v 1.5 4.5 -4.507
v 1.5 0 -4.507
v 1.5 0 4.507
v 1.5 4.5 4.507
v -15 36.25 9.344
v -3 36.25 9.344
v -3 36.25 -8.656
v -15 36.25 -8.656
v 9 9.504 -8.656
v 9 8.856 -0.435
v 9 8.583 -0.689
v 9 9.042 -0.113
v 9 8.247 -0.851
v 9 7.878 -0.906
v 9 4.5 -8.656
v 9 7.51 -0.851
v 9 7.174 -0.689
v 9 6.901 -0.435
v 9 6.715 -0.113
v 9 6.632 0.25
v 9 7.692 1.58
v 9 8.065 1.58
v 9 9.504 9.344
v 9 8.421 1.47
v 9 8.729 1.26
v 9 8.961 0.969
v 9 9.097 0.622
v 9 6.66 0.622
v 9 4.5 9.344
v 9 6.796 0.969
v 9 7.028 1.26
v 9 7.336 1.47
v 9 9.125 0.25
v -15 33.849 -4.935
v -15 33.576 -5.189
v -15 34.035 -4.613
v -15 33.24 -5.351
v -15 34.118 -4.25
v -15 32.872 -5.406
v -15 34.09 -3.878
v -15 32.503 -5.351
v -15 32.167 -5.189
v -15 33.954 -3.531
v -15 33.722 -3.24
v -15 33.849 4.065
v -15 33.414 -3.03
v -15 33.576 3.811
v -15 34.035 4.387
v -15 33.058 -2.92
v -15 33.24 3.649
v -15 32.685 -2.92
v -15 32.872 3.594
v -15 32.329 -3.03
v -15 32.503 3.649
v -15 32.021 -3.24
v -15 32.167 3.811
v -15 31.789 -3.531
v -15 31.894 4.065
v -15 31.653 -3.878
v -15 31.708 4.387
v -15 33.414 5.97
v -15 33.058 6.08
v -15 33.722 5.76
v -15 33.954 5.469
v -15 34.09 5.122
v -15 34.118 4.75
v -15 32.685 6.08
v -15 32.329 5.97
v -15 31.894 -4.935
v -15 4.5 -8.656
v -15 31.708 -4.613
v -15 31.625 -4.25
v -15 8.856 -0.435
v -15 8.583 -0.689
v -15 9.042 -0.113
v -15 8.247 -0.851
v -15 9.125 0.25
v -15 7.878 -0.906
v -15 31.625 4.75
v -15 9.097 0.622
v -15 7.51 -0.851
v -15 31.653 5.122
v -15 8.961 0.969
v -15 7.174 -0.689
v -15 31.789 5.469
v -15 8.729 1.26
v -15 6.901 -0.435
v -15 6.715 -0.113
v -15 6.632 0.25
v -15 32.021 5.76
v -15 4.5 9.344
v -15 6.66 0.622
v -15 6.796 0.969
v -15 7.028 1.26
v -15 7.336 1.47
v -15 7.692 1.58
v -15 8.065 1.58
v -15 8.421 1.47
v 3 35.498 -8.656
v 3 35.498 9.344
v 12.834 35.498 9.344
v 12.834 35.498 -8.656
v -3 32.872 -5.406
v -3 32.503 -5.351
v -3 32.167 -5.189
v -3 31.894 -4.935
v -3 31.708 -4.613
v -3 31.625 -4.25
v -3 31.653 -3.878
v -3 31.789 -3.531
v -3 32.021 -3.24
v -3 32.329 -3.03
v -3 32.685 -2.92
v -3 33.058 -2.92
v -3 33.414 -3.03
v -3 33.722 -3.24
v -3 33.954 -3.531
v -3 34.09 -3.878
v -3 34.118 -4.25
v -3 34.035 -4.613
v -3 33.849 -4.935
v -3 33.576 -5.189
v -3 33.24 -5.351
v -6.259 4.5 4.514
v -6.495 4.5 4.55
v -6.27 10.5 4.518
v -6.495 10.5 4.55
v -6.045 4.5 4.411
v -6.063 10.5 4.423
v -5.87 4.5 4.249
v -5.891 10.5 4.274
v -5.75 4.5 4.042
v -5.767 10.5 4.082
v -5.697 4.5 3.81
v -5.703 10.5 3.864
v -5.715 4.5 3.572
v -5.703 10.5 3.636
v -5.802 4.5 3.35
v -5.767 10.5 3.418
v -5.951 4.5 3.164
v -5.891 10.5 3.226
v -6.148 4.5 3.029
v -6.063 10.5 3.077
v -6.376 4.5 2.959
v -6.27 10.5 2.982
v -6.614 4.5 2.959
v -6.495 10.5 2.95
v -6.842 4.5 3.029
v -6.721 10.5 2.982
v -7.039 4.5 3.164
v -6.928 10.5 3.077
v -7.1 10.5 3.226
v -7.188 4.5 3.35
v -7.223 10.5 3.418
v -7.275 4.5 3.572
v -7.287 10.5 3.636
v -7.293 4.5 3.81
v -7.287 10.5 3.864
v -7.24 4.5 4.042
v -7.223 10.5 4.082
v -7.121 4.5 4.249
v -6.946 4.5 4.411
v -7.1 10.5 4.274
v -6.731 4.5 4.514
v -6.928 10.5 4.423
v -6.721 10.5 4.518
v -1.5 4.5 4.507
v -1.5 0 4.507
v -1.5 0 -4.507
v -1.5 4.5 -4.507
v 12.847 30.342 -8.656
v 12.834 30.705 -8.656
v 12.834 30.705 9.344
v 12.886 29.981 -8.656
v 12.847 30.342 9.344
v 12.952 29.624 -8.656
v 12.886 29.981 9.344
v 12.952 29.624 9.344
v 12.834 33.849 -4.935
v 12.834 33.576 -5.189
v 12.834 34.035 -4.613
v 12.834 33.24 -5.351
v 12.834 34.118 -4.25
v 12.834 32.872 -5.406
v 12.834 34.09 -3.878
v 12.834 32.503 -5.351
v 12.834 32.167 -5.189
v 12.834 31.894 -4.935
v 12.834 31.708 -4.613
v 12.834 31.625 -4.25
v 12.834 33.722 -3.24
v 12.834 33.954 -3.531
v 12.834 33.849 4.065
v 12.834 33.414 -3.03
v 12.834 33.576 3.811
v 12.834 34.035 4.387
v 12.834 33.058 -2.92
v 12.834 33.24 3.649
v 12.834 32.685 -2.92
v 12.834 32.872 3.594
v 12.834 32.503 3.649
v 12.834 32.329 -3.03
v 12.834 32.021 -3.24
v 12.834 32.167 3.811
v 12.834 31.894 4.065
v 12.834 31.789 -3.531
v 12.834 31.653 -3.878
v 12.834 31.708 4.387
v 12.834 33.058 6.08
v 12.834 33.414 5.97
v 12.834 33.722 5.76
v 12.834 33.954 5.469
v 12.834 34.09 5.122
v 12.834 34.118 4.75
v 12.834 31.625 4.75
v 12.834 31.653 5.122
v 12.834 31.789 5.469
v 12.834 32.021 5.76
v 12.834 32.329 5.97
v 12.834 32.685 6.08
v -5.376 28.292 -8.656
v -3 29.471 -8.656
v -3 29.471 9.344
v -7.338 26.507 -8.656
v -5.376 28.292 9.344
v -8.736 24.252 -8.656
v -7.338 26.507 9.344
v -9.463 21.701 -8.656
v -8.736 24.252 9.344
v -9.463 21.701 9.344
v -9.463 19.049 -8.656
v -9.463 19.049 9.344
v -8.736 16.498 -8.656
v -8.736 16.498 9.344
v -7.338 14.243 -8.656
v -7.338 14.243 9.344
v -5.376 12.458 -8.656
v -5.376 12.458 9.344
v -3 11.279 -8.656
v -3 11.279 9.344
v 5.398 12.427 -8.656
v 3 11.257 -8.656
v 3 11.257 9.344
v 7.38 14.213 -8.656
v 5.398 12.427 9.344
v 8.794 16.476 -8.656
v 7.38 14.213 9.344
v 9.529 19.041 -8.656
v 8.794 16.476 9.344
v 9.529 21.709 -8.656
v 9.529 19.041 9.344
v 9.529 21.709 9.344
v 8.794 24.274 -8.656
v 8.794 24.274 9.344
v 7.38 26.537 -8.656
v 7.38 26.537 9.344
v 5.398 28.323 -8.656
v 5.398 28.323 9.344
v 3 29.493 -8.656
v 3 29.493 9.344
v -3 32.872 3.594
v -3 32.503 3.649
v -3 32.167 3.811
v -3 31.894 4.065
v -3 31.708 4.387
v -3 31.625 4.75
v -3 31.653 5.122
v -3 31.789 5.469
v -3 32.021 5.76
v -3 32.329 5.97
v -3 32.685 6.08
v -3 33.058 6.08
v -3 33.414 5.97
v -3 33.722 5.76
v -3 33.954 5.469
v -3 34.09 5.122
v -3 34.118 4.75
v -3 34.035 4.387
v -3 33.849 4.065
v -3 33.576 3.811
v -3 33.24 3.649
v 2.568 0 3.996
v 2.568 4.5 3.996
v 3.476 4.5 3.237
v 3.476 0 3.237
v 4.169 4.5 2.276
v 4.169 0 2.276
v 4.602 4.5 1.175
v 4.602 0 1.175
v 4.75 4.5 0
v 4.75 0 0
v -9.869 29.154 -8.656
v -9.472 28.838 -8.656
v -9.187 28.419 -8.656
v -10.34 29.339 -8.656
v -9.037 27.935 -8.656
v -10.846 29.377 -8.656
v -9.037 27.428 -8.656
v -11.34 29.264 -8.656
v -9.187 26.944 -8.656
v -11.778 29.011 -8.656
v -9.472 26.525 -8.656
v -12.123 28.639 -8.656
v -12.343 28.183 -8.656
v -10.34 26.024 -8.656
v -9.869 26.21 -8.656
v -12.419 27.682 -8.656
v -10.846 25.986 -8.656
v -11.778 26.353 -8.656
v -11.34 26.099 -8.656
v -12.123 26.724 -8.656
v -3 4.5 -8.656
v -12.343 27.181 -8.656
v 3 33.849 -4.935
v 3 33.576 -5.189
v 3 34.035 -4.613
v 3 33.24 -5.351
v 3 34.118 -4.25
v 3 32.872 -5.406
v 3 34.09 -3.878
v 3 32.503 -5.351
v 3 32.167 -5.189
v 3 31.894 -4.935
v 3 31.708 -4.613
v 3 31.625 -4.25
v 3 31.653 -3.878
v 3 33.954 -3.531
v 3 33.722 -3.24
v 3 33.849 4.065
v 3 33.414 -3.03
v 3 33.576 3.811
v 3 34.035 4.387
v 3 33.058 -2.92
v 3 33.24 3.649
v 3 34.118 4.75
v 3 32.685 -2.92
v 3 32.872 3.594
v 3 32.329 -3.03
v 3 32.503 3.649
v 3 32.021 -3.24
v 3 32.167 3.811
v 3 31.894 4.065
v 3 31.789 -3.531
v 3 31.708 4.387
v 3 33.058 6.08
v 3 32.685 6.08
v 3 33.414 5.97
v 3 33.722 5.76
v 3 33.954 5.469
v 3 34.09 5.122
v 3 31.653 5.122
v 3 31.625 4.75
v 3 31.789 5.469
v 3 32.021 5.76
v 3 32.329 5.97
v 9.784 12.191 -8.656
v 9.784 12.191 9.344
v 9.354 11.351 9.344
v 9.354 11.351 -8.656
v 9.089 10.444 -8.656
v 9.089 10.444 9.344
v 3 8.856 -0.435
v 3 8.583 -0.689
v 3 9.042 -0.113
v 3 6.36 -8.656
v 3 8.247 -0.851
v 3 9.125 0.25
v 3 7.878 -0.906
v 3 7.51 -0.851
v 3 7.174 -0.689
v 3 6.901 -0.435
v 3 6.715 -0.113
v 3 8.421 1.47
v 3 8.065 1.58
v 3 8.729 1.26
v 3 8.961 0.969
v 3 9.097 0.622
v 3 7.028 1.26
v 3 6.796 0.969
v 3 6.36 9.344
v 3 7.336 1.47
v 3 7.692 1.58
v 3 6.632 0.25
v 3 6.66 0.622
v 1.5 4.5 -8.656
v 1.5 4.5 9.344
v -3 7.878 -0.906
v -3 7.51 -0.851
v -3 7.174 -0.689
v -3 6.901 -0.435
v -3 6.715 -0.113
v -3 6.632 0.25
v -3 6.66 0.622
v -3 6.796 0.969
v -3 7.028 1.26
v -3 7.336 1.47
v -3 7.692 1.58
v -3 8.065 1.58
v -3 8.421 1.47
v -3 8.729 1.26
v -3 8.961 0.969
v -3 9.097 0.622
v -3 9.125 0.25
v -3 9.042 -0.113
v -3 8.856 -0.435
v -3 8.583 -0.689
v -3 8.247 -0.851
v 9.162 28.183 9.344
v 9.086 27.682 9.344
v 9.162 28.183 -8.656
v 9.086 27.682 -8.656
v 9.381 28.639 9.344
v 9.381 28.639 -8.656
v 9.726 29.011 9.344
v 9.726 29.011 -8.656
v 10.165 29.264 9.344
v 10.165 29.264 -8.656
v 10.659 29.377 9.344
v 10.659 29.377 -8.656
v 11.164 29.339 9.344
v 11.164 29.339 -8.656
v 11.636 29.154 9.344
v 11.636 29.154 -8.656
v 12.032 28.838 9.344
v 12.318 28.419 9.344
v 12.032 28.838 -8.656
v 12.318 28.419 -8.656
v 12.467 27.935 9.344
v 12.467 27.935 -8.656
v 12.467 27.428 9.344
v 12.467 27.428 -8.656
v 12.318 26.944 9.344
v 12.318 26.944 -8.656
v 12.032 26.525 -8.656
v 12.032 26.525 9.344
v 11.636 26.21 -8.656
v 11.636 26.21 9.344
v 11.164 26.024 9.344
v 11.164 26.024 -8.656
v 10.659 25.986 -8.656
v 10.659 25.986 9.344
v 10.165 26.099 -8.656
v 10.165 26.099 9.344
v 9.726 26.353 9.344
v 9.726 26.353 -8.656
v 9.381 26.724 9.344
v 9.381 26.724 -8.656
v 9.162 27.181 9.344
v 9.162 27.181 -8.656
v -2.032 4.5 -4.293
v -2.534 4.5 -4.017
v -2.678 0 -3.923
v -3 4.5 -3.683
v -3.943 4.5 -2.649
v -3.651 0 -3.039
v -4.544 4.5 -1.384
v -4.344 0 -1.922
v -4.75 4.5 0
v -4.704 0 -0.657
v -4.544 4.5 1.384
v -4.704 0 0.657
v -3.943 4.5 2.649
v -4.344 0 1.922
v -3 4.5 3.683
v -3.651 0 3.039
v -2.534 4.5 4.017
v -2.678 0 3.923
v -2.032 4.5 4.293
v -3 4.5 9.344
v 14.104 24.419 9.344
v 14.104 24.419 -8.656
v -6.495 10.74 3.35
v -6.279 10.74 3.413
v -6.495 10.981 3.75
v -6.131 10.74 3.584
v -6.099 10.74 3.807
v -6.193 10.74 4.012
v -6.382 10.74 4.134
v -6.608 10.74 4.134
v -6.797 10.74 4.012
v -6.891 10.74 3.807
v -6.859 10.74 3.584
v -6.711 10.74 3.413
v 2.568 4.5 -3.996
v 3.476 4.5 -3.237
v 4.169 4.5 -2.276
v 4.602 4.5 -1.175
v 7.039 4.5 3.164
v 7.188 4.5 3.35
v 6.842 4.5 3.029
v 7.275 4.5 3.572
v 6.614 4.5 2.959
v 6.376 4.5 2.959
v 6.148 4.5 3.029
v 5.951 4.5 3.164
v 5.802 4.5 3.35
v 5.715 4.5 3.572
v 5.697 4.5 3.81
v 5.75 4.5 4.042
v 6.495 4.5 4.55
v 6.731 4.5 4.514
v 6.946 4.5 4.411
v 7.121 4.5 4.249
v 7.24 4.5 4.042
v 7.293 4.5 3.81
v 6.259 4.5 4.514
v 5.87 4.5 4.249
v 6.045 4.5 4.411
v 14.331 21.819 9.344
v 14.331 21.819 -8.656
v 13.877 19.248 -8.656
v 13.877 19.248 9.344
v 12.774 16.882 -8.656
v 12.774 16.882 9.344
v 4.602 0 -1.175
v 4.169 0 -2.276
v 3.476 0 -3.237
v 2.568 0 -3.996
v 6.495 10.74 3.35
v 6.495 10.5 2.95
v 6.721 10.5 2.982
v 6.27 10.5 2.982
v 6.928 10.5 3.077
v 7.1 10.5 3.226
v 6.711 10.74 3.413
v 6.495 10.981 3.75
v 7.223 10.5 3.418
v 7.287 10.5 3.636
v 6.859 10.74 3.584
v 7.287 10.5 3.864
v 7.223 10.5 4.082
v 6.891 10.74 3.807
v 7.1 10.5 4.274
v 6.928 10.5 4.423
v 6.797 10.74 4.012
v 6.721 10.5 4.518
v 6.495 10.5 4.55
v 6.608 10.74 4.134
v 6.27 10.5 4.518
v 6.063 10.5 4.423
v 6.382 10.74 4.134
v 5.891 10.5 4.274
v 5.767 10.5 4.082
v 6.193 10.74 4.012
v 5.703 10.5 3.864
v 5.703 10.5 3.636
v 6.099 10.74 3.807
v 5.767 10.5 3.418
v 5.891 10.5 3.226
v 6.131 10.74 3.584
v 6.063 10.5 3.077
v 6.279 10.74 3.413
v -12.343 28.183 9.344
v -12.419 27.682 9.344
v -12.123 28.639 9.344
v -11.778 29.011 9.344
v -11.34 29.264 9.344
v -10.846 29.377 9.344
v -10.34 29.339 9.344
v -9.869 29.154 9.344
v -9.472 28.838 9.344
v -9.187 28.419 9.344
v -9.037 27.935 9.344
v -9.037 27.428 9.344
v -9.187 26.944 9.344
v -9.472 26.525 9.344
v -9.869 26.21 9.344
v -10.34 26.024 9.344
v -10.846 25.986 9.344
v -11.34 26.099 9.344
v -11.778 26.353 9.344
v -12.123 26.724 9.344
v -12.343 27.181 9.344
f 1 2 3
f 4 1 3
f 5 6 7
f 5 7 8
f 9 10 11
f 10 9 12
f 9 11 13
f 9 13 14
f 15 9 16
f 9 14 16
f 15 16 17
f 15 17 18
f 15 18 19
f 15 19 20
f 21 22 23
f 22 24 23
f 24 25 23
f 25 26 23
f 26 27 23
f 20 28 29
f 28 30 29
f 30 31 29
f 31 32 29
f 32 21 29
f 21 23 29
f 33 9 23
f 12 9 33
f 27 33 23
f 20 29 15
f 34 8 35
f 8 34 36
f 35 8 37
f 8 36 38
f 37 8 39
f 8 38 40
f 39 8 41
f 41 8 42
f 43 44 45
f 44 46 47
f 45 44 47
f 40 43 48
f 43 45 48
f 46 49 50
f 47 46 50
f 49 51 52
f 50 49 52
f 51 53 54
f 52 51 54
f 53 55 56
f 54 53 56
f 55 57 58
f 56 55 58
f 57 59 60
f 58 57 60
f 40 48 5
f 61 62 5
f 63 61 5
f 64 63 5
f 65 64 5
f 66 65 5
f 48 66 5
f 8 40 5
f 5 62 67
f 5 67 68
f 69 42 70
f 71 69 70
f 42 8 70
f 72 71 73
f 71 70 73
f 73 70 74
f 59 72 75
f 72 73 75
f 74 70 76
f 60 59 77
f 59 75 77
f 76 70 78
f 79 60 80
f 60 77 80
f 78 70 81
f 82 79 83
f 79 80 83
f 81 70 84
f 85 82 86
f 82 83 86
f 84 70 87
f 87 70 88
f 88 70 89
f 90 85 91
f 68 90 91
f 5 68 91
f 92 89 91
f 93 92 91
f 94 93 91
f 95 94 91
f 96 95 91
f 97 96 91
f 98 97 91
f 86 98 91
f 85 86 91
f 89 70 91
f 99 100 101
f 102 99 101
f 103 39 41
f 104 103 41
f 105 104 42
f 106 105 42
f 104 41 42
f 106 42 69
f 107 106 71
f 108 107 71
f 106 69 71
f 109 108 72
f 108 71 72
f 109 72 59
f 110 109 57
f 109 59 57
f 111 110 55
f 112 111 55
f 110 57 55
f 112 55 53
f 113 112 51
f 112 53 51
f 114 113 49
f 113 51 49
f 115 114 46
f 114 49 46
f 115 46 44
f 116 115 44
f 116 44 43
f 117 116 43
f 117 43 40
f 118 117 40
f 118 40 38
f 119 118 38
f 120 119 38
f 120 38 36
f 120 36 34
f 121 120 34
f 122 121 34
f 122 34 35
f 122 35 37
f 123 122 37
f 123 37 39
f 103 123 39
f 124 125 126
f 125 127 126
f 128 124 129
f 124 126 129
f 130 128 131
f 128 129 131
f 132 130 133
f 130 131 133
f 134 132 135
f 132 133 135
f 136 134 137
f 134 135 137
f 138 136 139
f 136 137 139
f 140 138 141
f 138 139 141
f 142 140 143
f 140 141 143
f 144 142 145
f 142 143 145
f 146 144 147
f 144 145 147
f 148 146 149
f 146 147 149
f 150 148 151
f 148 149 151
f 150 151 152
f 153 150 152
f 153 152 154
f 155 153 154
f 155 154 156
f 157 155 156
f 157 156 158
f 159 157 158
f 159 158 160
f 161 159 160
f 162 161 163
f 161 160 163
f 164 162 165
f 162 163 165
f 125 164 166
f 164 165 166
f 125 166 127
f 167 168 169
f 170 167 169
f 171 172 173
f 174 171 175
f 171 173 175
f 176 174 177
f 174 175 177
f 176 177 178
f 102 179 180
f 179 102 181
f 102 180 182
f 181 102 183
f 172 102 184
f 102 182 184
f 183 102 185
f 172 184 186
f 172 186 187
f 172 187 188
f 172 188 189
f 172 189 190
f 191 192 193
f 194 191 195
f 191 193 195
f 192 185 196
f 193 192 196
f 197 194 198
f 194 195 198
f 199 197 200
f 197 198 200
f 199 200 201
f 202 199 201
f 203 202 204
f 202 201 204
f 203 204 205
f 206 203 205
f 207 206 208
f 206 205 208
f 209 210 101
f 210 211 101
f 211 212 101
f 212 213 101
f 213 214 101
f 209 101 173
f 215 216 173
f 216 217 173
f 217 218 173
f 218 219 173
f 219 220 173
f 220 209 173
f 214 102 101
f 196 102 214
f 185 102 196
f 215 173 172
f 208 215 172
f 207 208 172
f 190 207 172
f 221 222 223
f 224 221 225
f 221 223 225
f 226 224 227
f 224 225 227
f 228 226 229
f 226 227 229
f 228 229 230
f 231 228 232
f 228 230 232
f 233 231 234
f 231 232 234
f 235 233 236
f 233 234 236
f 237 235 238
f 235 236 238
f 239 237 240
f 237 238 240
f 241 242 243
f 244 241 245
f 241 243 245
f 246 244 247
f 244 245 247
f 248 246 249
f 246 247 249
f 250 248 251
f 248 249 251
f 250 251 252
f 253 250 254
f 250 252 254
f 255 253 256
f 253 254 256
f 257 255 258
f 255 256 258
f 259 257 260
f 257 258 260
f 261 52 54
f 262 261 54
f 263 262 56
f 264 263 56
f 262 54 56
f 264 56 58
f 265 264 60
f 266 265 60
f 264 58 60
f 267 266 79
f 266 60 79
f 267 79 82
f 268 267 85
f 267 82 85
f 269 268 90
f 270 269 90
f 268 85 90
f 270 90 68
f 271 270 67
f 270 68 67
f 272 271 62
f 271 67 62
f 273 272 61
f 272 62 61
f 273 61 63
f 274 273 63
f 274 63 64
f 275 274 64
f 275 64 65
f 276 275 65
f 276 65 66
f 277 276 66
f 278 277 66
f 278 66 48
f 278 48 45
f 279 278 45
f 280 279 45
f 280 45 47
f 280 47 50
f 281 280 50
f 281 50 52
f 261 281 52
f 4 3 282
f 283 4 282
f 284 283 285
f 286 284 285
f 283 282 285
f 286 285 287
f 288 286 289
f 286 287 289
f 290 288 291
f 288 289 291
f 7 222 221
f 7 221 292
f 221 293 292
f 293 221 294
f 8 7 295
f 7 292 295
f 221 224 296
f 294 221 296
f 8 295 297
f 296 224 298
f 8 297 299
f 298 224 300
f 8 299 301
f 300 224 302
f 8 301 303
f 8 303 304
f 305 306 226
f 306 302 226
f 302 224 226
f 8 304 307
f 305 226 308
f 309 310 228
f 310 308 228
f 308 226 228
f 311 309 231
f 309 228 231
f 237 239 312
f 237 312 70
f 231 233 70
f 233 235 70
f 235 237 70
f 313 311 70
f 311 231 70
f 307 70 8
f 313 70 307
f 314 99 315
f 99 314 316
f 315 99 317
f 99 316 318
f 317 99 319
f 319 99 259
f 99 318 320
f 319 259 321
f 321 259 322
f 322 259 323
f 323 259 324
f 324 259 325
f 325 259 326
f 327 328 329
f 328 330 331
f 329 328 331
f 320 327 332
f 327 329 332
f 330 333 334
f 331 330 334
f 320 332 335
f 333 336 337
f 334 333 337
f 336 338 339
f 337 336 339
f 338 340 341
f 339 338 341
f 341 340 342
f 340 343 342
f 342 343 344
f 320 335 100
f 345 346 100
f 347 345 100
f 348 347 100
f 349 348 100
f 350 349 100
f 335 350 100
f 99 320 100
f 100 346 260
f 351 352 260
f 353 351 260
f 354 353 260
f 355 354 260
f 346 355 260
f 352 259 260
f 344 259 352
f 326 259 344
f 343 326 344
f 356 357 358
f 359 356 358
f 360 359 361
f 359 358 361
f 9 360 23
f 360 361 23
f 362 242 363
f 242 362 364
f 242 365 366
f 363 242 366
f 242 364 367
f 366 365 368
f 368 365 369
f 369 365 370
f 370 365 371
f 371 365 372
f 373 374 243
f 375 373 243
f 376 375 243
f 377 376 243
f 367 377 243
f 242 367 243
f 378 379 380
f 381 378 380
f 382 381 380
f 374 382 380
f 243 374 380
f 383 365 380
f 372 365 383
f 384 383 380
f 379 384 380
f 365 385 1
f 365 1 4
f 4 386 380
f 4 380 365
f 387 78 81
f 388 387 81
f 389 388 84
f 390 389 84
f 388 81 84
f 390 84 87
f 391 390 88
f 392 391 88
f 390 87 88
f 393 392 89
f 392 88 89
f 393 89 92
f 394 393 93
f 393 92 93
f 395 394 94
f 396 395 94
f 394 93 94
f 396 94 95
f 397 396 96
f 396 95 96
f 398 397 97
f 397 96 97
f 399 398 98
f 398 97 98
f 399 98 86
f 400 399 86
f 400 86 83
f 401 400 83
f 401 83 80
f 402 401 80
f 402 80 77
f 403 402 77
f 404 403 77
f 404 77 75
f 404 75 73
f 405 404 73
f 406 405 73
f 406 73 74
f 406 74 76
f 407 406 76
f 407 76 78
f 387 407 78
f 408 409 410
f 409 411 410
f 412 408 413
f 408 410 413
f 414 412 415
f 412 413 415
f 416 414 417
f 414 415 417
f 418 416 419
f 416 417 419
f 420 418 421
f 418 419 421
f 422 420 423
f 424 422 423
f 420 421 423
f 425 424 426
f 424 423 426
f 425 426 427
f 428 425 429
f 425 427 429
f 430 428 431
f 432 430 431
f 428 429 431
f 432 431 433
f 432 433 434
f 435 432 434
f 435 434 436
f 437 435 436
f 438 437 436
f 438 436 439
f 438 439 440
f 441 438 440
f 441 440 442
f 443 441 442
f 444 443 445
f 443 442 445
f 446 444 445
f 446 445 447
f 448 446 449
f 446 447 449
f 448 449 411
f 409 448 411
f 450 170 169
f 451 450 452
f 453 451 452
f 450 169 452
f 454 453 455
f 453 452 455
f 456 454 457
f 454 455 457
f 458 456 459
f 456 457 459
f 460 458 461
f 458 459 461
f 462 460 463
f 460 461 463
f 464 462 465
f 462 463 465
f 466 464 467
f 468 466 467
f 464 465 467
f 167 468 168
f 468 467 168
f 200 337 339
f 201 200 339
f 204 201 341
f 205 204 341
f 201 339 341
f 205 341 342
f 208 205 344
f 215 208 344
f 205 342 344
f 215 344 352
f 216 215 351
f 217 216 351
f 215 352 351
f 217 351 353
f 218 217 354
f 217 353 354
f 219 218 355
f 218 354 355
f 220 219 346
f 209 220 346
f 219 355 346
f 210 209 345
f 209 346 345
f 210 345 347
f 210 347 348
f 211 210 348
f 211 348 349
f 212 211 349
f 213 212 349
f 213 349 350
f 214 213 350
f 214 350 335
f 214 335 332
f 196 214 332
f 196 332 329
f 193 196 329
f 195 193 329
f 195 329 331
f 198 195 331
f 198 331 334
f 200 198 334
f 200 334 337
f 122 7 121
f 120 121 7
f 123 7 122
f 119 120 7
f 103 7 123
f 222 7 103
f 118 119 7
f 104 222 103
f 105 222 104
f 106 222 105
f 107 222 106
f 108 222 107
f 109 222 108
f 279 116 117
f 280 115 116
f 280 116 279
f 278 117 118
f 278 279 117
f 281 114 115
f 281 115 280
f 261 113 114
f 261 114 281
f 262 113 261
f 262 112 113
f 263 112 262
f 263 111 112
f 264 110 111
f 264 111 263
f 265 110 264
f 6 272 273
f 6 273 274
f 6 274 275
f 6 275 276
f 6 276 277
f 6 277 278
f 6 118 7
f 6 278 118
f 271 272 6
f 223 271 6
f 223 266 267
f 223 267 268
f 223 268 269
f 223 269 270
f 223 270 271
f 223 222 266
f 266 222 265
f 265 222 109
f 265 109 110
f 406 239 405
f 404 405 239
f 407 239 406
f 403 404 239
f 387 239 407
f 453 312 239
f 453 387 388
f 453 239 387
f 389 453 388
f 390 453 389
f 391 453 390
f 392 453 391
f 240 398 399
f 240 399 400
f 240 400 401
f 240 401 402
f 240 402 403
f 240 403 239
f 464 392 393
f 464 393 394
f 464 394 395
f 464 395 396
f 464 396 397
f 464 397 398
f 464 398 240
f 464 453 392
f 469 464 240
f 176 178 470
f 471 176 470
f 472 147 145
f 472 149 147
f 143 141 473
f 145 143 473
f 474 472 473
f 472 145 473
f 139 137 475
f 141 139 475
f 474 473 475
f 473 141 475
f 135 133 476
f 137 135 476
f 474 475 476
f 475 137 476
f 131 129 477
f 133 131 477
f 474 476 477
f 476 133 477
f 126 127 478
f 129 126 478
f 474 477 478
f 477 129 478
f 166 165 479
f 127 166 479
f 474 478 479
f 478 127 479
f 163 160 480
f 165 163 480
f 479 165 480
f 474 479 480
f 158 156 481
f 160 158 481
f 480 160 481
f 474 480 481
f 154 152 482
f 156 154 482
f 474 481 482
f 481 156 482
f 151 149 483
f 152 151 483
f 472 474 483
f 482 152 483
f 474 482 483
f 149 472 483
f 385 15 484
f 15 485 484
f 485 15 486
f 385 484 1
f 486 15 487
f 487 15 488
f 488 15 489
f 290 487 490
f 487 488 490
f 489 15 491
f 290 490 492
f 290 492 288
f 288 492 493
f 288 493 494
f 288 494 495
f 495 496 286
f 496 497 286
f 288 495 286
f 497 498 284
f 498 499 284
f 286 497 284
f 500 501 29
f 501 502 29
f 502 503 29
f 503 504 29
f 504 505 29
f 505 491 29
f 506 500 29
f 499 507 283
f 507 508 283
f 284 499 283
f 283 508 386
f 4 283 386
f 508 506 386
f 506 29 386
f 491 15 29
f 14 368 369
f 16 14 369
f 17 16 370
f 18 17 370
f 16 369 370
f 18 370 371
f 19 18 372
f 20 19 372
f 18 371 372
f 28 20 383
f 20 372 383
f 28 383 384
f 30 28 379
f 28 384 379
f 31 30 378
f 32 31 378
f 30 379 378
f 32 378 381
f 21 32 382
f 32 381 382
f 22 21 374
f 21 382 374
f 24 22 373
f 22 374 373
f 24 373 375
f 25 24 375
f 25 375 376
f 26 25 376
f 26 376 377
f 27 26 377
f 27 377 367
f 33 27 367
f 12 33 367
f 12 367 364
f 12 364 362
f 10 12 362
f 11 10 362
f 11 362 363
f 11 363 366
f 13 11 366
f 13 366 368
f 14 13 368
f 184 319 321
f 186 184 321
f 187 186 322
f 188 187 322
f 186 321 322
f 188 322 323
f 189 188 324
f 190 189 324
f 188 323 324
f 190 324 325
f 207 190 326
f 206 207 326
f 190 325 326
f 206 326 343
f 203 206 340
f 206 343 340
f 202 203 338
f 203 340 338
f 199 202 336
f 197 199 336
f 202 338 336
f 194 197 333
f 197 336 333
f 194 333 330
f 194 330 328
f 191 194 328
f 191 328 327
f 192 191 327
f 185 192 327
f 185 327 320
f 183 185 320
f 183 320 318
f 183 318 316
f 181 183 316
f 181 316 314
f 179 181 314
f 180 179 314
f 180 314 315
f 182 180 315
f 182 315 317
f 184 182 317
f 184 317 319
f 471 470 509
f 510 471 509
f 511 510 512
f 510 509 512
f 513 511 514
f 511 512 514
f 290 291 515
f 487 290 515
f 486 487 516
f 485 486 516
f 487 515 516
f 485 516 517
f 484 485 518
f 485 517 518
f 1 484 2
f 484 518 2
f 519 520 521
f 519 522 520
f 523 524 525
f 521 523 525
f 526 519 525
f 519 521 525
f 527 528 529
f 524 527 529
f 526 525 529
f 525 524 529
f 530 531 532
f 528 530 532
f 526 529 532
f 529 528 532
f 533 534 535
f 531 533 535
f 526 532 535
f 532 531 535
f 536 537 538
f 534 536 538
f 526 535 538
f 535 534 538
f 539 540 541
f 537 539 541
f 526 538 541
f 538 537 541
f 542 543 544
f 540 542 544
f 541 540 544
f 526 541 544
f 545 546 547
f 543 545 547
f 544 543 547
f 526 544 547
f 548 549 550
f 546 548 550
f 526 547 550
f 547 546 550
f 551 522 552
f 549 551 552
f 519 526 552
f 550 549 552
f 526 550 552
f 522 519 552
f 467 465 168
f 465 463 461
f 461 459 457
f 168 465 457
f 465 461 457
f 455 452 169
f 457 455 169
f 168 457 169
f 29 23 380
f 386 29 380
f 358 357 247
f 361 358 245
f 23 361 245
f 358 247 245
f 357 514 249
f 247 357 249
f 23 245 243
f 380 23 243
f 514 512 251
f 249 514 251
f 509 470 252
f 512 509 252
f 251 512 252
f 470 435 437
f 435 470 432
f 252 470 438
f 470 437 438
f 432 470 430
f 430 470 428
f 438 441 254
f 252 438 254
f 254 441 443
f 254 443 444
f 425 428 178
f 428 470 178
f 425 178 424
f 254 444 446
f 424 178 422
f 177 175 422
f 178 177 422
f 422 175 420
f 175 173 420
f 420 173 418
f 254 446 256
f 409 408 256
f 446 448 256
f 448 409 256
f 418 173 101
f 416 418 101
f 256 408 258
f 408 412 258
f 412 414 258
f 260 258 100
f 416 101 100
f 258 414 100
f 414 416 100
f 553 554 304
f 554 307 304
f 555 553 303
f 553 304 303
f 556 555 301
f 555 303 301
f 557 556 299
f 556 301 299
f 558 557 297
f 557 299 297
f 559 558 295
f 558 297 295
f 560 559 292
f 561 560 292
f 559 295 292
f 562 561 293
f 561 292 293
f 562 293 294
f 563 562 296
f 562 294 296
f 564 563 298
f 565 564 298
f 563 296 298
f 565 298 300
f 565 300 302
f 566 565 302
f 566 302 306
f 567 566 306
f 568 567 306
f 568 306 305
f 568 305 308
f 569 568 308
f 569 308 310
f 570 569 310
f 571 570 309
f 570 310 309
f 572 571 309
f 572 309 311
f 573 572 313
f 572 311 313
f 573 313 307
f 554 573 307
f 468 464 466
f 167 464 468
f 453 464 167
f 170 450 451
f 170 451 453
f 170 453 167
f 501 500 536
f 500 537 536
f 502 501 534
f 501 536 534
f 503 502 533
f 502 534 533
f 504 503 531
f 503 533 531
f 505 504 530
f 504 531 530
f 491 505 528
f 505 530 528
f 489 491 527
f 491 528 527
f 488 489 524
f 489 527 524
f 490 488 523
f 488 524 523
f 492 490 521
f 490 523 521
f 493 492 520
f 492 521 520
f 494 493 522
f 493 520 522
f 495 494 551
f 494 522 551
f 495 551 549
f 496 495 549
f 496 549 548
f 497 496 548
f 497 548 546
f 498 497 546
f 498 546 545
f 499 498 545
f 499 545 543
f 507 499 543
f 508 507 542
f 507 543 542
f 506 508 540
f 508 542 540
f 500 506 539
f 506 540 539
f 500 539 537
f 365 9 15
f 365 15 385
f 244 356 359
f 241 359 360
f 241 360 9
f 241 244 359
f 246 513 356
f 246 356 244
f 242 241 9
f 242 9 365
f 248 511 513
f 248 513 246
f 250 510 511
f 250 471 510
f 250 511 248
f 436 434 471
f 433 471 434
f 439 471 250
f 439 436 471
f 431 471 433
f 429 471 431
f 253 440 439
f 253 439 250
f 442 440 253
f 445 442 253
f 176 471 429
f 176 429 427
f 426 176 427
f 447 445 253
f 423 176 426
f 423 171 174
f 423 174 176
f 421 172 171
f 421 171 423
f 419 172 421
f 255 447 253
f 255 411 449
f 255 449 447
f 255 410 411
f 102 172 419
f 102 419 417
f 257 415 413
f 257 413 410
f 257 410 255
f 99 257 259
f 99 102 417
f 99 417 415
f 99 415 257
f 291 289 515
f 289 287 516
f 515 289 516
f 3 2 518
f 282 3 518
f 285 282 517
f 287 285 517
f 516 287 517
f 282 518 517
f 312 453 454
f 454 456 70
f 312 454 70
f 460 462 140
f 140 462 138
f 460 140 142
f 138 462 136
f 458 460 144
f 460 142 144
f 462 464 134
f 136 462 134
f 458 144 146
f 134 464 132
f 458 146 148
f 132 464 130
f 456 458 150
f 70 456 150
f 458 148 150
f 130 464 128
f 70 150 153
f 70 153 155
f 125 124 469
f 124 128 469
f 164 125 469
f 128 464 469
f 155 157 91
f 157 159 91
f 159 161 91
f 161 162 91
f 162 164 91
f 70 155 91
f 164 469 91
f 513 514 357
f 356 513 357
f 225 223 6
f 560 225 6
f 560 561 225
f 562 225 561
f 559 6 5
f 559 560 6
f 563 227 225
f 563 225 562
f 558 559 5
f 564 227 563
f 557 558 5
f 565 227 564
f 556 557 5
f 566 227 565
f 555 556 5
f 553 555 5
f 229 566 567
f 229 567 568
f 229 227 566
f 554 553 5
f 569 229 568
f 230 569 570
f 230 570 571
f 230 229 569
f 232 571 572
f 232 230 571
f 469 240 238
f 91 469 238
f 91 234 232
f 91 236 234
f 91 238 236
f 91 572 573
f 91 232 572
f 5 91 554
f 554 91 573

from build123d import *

# Parameters (mm, degrees)
SKETCH2_W                 = 12
SKETCH2_H                 = 18
EXTRUDE1_DEPTH            = 31.75
EXTRUDE1_2_DEPTH          = 31.75
EXTRUDE2_DEPTH            = 4.5
SKETCH4_R                 = 9.5885
MAGNET_CAVITY_DEPTH       = 19
M3X0_5_TAPPED_HOLE1_D     = 2.5
M2X0_4_TAPPED_HOLE2_D     = 1.6
M2X0_4_TAPPED_HOLE2_DEPTH = 6
M2X0_4_TAPPED_HOLE2_TIP   = 0.480688495
M3_CLEARANCE_HOLE1_D      = 3.4
M3_CLEARANCE_HOLE1_DEPTH  = 18
M3_CLEARANCE_HOLE1_TIP    = 1.021463052
EXTRUDE3_DEPTH            = 19
EXTRUDE4_DEPTH            = 18


with BuildPart() as part:
    # Sketch2 → Extrude1 (new body)
    with BuildSketch(Plane(origin=(0, 4.5, 0), x_dir=(-1, 0, 0), z_dir=(0, 1, 0))):
        with Locations((9, 0.343878918)):
            Rectangle(SKETCH2_W, SKETCH2_H)
    extrude(amount=EXTRUDE1_DEPTH)



with BuildPart() as body_2:
    # Sketch2 → Extrude1 2 (new body)
    with BuildSketch(Plane(origin=(0, 4.5, 0), x_dir=(-1, 0, 0), z_dir=(0, 1, 0))):
        with Locations((-9, 0.343878918)):
            Rectangle(SKETCH2_W, SKETCH2_H)
    extrude(amount=EXTRUDE1_2_DEPTH)


with BuildPart() as part_1:
    add(part.part)

    add(body_2.part)  # Extrude2 merges body 2
    # Sketch1 → Extrude2 (add)
    with BuildSketch(Plane(origin=(0, 0, 0), x_dir=(1, 0, 0), z_dir=(0, 1, 0))):
        with BuildLine():
            ThreePointArc((4.75, 0), (3.852758752, 2.778263846), (1.5, 4.506939094))
            Line((1.5, 4.506939094), (1.5, -4.506939094))
            ThreePointArc((1.5, -4.506939094), (3.852758752, -2.778263846), (4.75, 0))
        make_face()
        with BuildLine():
            Line((-1.5, -4.506939094), (-1.5, 4.506939094))
            ThreePointArc((-1.5, 4.506939094), (-4.75, 0), (-1.5, -4.506939094))
        make_face()
    extrude(amount=EXTRUDE2_DEPTH)

    # Sketch4 → Magnet Cavity (cut, through all)
    with BuildSketch(Plane.XY.offset(9.343878918)):
        with Locations((0.033766691, 20.375)):
            Circle(SKETCH4_R)
    extrude(amount=-MAGNET_CAVITY_DEPTH, mode=Mode.SUBTRACT)

    # M3x0.5 Tapped Hole1 (through all)
    with Locations(Plane(origin=(15, 32.871578641, 4.843878918), x_dir=(0, 0, 1), z_dir=(1, 0, 0))):
        with Locations((0, 0), (-9, 0), (-4.5, 24.993157282)):
            Hole(M3X0_5_TAPPED_HOLE1_D / 2)

    # M2x0.4 Tapped Hole2
    with Locations(Plane(origin=(-6.495190528, 4.5, 3.75), x_dir=(0, 0, -1), z_dir=(0, -1, 0))):
        with Locations((0, 0), (0, 12.990381056)):
            Hole(M2X0_4_TAPPED_HOLE2_D / 2, depth=M2X0_4_TAPPED_HOLE2_DEPTH)
            with Locations((0, 0, -(M2X0_4_TAPPED_HOLE2_DEPTH + M2X0_4_TAPPED_HOLE2_TIP / 2))):  # 118° drill point
                Cone(0, M2X0_4_TAPPED_HOLE2_D / 2, M2X0_4_TAPPED_HOLE2_TIP, mode=Mode.SUBTRACT)

    # M3 Clearance Hole1
    with Locations(Plane(origin=(-10.718511689, 27.68174412, 9.343878918), x_dir=(1, 0, 0), z_dir=(0, 0, 1))):
        with Locations((0, 0), (21.50455676, 0)):
            Hole(M3_CLEARANCE_HOLE1_D / 2, depth=M3_CLEARANCE_HOLE1_DEPTH)
            with Locations((0, 0, -(M3_CLEARANCE_HOLE1_DEPTH + M3_CLEARANCE_HOLE1_TIP / 2))):  # 118° drill point
                Cone(0, M3_CLEARANCE_HOLE1_D / 2, M3_CLEARANCE_HOLE1_TIP, mode=Mode.SUBTRACT)

    # Trim Sketch → Extrude3 (cut, through all)
    with BuildSketch(Plane.XY.offset(9.343878918)):
        with BuildLine():
            Line((9, 9.503868704), (9, 4.5))
            Line((9, 4.5), (15, 4.5))
            Line((15, 4.5), (15, 36.25))
            Line((15, 36.25), (3, 36.25))
            Line((3, 36.25), (3, 35.497506653))
            Line((3, 35.497506653), (12.833586371, 35.497506653))
            Line((12.833586371, 35.497506653), (12.833586371, 30.705187388))
            ThreePointArc((12.833586371, 30.705187388), (12.863239183, 30.161451393), (12.951845904, 29.624164718))
            Line((12.951845904, 29.624164718), (14.104451498, 24.419166219))
            ThreePointArc((14.104451498, 24.419166219), (14.188629696, 20.518267921), (12.773591061, 16.882094224))
            Line((12.773591061, 16.882094224), (9.783689751, 12.191382032))
            ThreePointArc((9.783689751, 12.191382032), (9.199919207, 10.903591669), (9, 9.503868704))
        make_face()
    extrude(amount=-EXTRUDE3_DEPTH, mode=Mode.SUBTRACT)

    # Sketch26 → Extrude4 (add)
    with BuildSketch(Plane.XY.offset(9.343878918)):
        Polygon((1.5, 4.5), (3, 6.359966873), (3, 4.5), align=None)
    extrude(amount=-EXTRUDE4_DEPTH)


solid = part_1.part
